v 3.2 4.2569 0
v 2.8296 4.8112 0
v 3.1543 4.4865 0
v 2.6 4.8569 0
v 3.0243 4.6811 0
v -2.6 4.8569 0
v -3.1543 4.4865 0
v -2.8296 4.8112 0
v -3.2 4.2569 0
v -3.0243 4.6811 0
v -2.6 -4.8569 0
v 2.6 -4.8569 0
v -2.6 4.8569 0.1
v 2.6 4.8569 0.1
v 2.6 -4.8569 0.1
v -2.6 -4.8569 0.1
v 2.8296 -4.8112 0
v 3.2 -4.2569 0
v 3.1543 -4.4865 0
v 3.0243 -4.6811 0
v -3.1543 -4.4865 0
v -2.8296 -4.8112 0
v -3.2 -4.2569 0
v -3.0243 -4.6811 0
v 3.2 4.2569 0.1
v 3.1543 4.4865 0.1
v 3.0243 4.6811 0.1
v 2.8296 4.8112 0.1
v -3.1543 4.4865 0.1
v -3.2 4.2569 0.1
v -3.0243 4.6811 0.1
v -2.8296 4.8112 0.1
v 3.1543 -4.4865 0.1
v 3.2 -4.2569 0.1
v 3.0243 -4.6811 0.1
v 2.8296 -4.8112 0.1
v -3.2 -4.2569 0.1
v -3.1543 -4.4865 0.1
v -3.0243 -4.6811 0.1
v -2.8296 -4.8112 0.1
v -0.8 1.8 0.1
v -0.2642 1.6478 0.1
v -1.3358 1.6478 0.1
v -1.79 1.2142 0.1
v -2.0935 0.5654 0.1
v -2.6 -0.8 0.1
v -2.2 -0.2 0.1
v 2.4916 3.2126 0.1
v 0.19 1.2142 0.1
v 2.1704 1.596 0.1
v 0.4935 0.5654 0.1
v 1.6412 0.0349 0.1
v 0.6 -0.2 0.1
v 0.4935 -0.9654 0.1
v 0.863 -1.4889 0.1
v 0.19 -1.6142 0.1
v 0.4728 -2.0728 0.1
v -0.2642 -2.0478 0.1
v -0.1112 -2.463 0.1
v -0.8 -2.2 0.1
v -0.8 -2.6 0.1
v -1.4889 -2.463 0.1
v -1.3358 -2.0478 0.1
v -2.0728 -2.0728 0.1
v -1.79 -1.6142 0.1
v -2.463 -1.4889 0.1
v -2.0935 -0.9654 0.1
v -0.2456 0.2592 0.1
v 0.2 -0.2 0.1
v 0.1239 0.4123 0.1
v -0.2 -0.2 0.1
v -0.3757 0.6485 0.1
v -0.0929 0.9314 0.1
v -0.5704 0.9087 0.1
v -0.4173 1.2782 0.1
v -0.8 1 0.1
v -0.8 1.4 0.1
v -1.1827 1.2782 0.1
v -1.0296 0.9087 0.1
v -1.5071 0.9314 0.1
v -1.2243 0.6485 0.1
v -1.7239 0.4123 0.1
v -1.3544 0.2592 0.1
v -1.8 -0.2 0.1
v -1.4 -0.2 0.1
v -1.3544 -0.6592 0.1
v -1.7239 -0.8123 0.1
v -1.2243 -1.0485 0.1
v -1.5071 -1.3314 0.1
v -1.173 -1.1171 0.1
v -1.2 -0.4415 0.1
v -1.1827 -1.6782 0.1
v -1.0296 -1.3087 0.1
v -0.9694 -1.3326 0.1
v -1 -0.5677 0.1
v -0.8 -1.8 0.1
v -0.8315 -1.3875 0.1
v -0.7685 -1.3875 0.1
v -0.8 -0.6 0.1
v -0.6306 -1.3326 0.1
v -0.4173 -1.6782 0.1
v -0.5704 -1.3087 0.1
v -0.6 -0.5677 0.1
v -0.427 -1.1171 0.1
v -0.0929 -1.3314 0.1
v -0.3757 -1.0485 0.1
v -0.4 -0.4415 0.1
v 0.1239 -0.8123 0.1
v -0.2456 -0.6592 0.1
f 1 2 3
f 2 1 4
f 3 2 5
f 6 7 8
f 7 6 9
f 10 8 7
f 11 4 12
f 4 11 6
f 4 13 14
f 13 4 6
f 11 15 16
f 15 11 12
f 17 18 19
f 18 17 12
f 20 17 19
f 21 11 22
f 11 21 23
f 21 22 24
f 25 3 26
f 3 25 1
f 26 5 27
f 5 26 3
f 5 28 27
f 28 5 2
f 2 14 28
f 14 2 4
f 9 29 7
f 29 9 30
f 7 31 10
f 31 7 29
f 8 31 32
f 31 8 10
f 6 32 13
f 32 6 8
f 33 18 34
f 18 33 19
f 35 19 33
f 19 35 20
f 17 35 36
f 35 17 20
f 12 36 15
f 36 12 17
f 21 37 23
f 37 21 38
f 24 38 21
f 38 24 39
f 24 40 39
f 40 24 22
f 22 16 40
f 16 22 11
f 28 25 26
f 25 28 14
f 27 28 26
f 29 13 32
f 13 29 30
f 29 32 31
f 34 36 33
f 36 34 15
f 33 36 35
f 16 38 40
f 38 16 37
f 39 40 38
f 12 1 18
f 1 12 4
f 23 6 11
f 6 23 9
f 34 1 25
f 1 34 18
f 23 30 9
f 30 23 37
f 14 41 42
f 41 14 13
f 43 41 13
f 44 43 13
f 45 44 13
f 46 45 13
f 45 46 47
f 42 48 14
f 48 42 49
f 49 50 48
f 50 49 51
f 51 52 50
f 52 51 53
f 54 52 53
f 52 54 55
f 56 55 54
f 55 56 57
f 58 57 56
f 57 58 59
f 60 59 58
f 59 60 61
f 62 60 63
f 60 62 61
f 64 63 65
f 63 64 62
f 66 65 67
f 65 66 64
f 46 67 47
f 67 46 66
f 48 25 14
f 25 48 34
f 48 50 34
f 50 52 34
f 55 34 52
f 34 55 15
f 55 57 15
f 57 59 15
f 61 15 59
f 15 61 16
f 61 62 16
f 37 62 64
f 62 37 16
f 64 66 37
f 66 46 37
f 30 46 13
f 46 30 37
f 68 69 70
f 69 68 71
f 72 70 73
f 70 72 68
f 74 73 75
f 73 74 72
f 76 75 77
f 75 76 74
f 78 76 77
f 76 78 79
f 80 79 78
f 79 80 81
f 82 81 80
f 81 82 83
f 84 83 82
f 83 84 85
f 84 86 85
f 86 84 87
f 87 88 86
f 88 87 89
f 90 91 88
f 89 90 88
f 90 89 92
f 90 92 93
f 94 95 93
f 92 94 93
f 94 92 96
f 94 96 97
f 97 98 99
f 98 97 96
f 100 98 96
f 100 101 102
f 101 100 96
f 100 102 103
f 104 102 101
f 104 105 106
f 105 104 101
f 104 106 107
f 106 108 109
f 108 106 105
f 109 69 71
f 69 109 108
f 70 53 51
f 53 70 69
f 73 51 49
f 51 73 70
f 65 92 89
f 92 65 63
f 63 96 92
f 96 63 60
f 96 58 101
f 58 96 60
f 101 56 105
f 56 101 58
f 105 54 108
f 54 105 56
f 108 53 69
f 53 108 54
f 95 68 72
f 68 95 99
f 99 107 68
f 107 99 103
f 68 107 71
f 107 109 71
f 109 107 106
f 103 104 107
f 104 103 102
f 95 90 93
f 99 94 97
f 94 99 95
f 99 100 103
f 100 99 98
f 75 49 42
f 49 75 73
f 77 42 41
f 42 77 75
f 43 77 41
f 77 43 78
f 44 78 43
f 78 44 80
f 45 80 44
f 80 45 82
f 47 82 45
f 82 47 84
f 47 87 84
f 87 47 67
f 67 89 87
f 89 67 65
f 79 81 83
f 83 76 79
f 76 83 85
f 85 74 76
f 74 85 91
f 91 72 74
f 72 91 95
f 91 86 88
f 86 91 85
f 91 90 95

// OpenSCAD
// file: ../p/box3u12.scad
use <../lib.scad>
function ldraw_lib__box3u12() = [
// 0 Box with 3 Parallel Faces without Any Edges
// 0 Name: box3u12.dat
// 0 Author: J.C. Tchang [tchang]
// 0 !LDRAW_ORG Primitive UPDATE 2014-02
// 0 !LICENSE Licensed under CC BY 4.0 : see CAreadme.txt
// 
// 0 BFC CERTIFY CCW
  [0,"BFC","CERTIFY"],
  [0,"BFC","CCW"],
// 
// 0 !HISTORY 2014-12-23 [PTadmin] Official Update 2014-02
// 
// 
// 4 16 -1 1 1 1 1 1 1 1 -1 -1 1 -1
  [4,16,-1,1,1,1,1,1,1,1,-1,-1,1,-1],
// 4 16 -1 1 1 -1 0 1 1 0 1 1 1 1
  [4,16,-1,1,1,-1,0,1,1,0,1,1,1,1],
// 4 16 1 1 -1 1 0 -1 -1 0 -1 -1 1 -1
  [4,16,1,1,-1,1,0,-1,-1,0,-1,-1,1,-1],
];
module ldraw_lib__box3u12(step=0, col=false, unit=2/5, alt=false, line=0.2, solid=!$preview)
    makepoly(ldraw_lib__box3u12(), step=step, col=col, unit=unit, alt=alt, line=line, solid=solid);
ldraw_lib__box3u12(line=0.2);
// file: ../p/1-4cyli.scad
use <../lib.scad>
function ldraw_lib__1_4cyli() = [
// 0 Cylinder 0.25
// 0 Name: 1-4cyli.dat
// 0 Author: James Jessiman
// 0 !LDRAW_ORG Primitive UPDATE 2012-01
// 0 !LICENSE Licensed under CC BY 4.0 : see CAreadme.txt
// 
// 0 BFC CERTIFY CCW
  [0,"BFC","CERTIFY"],
  [0,"BFC","CCW"],
// 
// 0 !HISTORY 2002-03-23 [sbliss] Added BFC statement.
// 0 !HISTORY 2002-04-25 [PTadmin] Official Update 2002-02
// 0 !HISTORY 2007-06-22 [PTadmin] Header formatted for Contributor Agreement
// 0 !HISTORY 2008-07-01 [PTadmin] Official Update 2008-01
// 0 !HISTORY 2012-02-16 [Philo] Changed to CCW
// 0 !HISTORY 2012-03-30 [PTadmin] Official Update 2012-01
// 
// 
// 4 16 1 1 0 0.9239 1 0.3827 0.9239 0 0.3827 1 0 0
  [4,16,1,1,0,0.9239,1,0.3827,0.9239,0,0.3827,1,0,0],
// 5 24 1 0 0 1 1 0 0.9239 0 0.3827 1 0 -1
  [5,24,1,0,0,1,1,0,0.9239,0,0.3827,1,0,-1],
// 4 16 0.9239 1 0.3827 0.7071 1 0.7071 0.7071 0 0.7071 0.9239 0 0.3827
  [4,16,0.9239,1,0.3827,0.7071,1,0.7071,0.7071,0,0.7071,0.9239,0,0.3827],
// 5 24 0.9239 0 0.3827 0.9239 1 0.3827 0.7071 0 0.7071 1 0 0
  [5,24,0.9239,0,0.3827,0.9239,1,0.3827,0.7071,0,0.7071,1,0,0],
// 4 16 0.7071 1 0.7071 0.3827 1 0.9239 0.3827 0 0.9239 0.7071 0 0.7071
  [4,16,0.7071,1,0.7071,0.3827,1,0.9239,0.3827,0,0.9239,0.7071,0,0.7071],
// 5 24 0.7071 0 0.7071 0.7071 1 0.7071 0.3827 0 0.9239 0.9239 0 0.3827
  [5,24,0.7071,0,0.7071,0.7071,1,0.7071,0.3827,0,0.9239,0.9239,0,0.3827],
// 4 16 0.3827 1 0.9239 0 1 1 0 0 1 0.3827 0 0.9239
  [4,16,0.3827,1,0.9239,0,1,1,0,0,1,0.3827,0,0.9239],
// 5 24 0.3827 0 0.9239 0.3827 1 0.9239 0 0 1 0.7071 0 0.7071
  [5,24,0.3827,0,0.9239,0.3827,1,0.9239,0,0,1,0.7071,0,0.7071],
// 5 24 0 0 1 0 1 1 0.3827 0 0.9239 -1 0 1
  [5,24,0,0,1,0,1,1,0.3827,0,0.9239,-1,0,1],
];
module ldraw_lib__1_4cyli(step=0, col=false, unit=2/5, alt=false, line=0.2, solid=!$preview)
    makepoly(ldraw_lib__1_4cyli(), step=step, col=col, unit=unit, alt=alt, line=line, solid=solid);
ldraw_lib__1_4cyli(line=0.2);
// file: ../p/1-4chrd.scad
use <../lib.scad>
function ldraw_lib__1_4chrd() = [
// 0 Chord 0.25
// 0 Name: 1-4chrd.dat
// 0 Author: Max Martin Richter [MMR1988]
// 0 !LDRAW_ORG Primitive UPDATE 2023-05
// 0 !LICENSE Licensed under CC BY 4.0 : see CAreadme.txt
// 
// 0 BFC CERTIFY CCW
  [0,"BFC","CERTIFY"],
  [0,"BFC","CCW"],
// 
// 0 !HISTORY 2004-04-22 [PTadmin] Official Update 2004-02
// 0 !HISTORY 2007-10-09 [PTadmin] Header formatted for Contributor Agreement
// 0 !HISTORY 2008-07-01 [PTadmin] Official Update 2008-01
// 0 !HISTORY 2012-08-02 [MMR1988] Re-creation with PrimGen2 and Rectifier
// 0 !HISTORY 2012-08-09 [PTadmin] Official Update 2012-02
// 0 !HISTORY 2023-10-27 [OrionP] Change author to MMR1988 from hafhead
// 0 !HISTORY 2023-10-31 [OrionP] Official Update 2023-05
// 
// 4 16 0.9239 0 0.3827 0.3827 0 0.9239 0 0 1 1 0 0
  [4,16,0.9239,0,0.3827,0.3827,0,0.9239,0,0,1,1,0,0],
// 3 16 0.7071 0 0.7071 0.3827 0 0.9239 0.9239 0 0.3827
  [3,16,0.7071,0,0.7071,0.3827,0,0.9239,0.9239,0,0.3827],
];
module ldraw_lib__1_4chrd(step=0, col=false, unit=2/5, alt=false, line=0.2, solid=!$preview)
    makepoly(ldraw_lib__1_4chrd(), step=step, col=col, unit=unit, alt=alt, line=line, solid=solid);
ldraw_lib__1_4chrd(line=0.2);
// file: s/6148328ags02.scad
use <../../lib.scad>
function ldraw_lib__s__6148328ags02() = [
// 0 ~Sticker  1.8 x  0.8 with Black Headlamp on White Background Right - Headlamp
// 0 Name: s\6148328ags02.dat
// 0 Author: Massimo Maso [Sirio]
// 0 !LDRAW_ORG Subpart UPDATE 2024-01
// 0 !LICENSE Licensed under CC BY 4.0 : see CAreadme.txt
// 
// 0 BFC CERTIFY CCW
  [0,"BFC","CERTIFY"],
  [0,"BFC","CCW"],
// 
// 0 !HISTORY 2024-01-29 [OrionP] Official Update 2024-01
// 
// 
// 0 // Faces
// 0 // Black faces
// 
// 4 0 2.3098 0 1.5308 1.3859 0 1.1481 1.5 0 0 2.5 0 0
  [4,0,2.3098,0,1.5308,1.3859,0,1.1481,1.5,0,0,2.5,0,0],
// 4 0 2.3098 0 1.5308 1.7678 0 2.8284 1.0607 0 2.1213 1.3859 0 1.1481
  [4,0,2.3098,0,1.5308,1.7678,0,2.8284,1.0607,0,2.1213,1.3859,0,1.1481],
// 4 0 .9568 0 3.6956 .5741 0 2.7717 1.0607 0 2.1213 1.7678 0 2.8284
  [4,0,.9568,0,3.6956,.5741,0,2.7717,1.0607,0,2.1213,1.7678,0,2.8284],
// 4 0 .9568 0 3.6956 0 0 4 0 0 3 .5741 0 2.7717
  [4,0,.9568,0,3.6956,0,0,4,0,0,3,.5741,0,2.7717],
// 4 0 -.9568 0 3.6956 -.5741 0 2.7717 0 0 3 0 0 4
  [4,0,-.9568,0,3.6956,-.5741,0,2.7717,0,0,3,0,0,4],
// 4 0 -.9568 0 3.6956 -1.7678 0 2.8284 -1.0607 0 2.1213 -.5741 0 2.7717
  [4,0,-.9568,0,3.6956,-1.7678,0,2.8284,-1.0607,0,2.1213,-.5741,0,2.7717],
// 4 0 -2.3098 0 1.5308 -1.3859 0 1.1481 -1.0607 0 2.1213 -1.7678 0 2.8284
  [4,0,-2.3098,0,1.5308,-1.3859,0,1.1481,-1.0607,0,2.1213,-1.7678,0,2.8284],
// 4 0 -2.3098 0 1.5308 -2.5 0 0 -1.5 0 0 -1.3859 0 1.1481
  [4,0,-2.3098,0,1.5308,-2.5,0,0,-1.5,0,0,-1.3859,0,1.1481],
// 4 0 -2.3098 0 -1.5308 -1.3859 0 -1.1481 -1.5 0 0 -2.5 0 0
  [4,0,-2.3098,0,-1.5308,-1.3859,0,-1.1481,-1.5,0,0,-2.5,0,0],
// 4 0 -2.3098 0 -1.5308 -1.7678 0 -2.8284 -1.0607 0 -2.1213 -1.3859 0 -1.1481
  [4,0,-2.3098,0,-1.5308,-1.7678,0,-2.8284,-1.0607,0,-2.1213,-1.3859,0,-1.1481],
// 3 0 -.9324 0 -2.2927 -1 0 -.6038 -1.0607 0 -2.1213
  [3,0,-.9324,0,-2.2927,-1,0,-.6038,-1.0607,0,-2.1213],
// 4 0 -.9324 0 -2.2927 -1.0607 0 -2.1213 -1.7678 0 -2.8284 -.9568 0 -3.6956
  [4,0,-.9324,0,-2.2927,-1.0607,0,-2.1213,-1.7678,0,-2.8284,-.9568,0,-3.6956],
// 3 0 -.9324 0 -2.2927 -.9568 0 -3.6956 -.5741 0 -2.7717
  [3,0,-.9324,0,-2.2927,-.9568,0,-3.6956,-.5741,0,-2.7717],
// 3 0 -.4235 0 -2.8316 -.5 0 -.9192 -.5741 0 -2.7717
  [3,0,-.4235,0,-2.8316,-.5,0,-.9192,-.5741,0,-2.7717],
// 4 0 -.4235 0 -2.8316 -.5741 0 -2.7717 -.9568 0 -3.6956 0 0 -4
  [4,0,-.4235,0,-2.8316,-.5741,0,-2.7717,-.9568,0,-3.6956,0,0,-4],
// 3 0 -.4235 0 -2.8316 0 0 -4 -.0787 0 -2.9687
  [3,0,-.4235,0,-2.8316,0,0,-4,-.0787,0,-2.9687],
// 4 0 0 0 -4 .0787 0 -2.9687 0 0 -1 -.0787 0 -2.9687
  [4,0,0,0,-4,.0787,0,-2.9687,0,0,-1,-.0787,0,-2.9687],
// 3 0 .4235 0 -2.8316 .0787 0 -2.9687 0 0 -4
  [3,0,.4235,0,-2.8316,.0787,0,-2.9687,0,0,-4],
// 4 0 .4235 0 -2.8316 0 0 -4 .9568 0 -3.6956 .5741 0 -2.7717
  [4,0,.4235,0,-2.8316,0,0,-4,.9568,0,-3.6956,.5741,0,-2.7717],
// 3 0 .4235 0 -2.8316 .5741 0 -2.7717 .5 0 -.9192
  [3,0,.4235,0,-2.8316,.5741,0,-2.7717,.5,0,-.9192],
// 3 0 .9324 0 -2.2927 .5741 0 -2.7717 .9568 0 -3.6956
  [3,0,.9324,0,-2.2927,.5741,0,-2.7717,.9568,0,-3.6956],
// 4 0 .9324 0 -2.2927 .9568 0 -3.6956 1.7678 0 -2.8284 1.0607 0 -2.1213
  [4,0,.9324,0,-2.2927,.9568,0,-3.6956,1.7678,0,-2.8284,1.0607,0,-2.1213],
// 3 0 .9324 0 -2.2927 1.0607 0 -2.1213 1 0 -.6038
  [3,0,.9324,0,-2.2927,1.0607,0,-2.1213,1,0,-.6038],
// 4 0 2.3098 0 -1.5308 1.3859 0 -1.1481 1.0607 0 -2.1213 1.7678 0 -2.8284
  [4,0,2.3098,0,-1.5308,1.3859,0,-1.1481,1.0607,0,-2.1213,1.7678,0,-2.8284],
// 4 0 2.3098 0 -1.5308 2.5 0 0 1.5 0 0 1.3859 0 -1.1481
  [4,0,2.3098,0,-1.5308,2.5,0,0,1.5,0,0,1.3859,0,-1.1481],
// 0 // Dark grey faces - actually halftone of white ndis and black disc
// 4 72 2.3098 0 1.5308 2.5 0 0 3.5 0 0 3.2337 0 1.9135
  [4,72,2.3098,0,1.5308,2.5,0,0,3.5,0,0,3.2337,0,1.9135],
// 4 72 2.3098 0 1.5308 3.2337 0 1.9135 2.4749 0 3.5355 1.7678 0 2.8284
  [4,72,2.3098,0,1.5308,3.2337,0,1.9135,2.4749,0,3.5355,1.7678,0,2.8284],
// 4 72 -.9568 0 -3.6956 -1.7678 0 -2.8284 -2.4749 0 -3.5355 -1.3395 0 -4.6195
  [4,72,-.9568,0,-3.6956,-1.7678,0,-2.8284,-2.4749,0,-3.5355,-1.3395,0,-4.6195],
// 4 72 -.9568 0 -3.6956 -1.3395 0 -4.6195 0 0 -5 0 0 -4
  [4,72,-.9568,0,-3.6956,-1.3395,0,-4.6195,0,0,-5,0,0,-4],
// 4 72 .9568 0 -3.6956 0 0 -4 0 0 -5 1.3395 0 -4.6195
  [4,72,.9568,0,-3.6956,0,0,-4,0,0,-5,1.3395,0,-4.6195],
// 4 72 .9568 0 -3.6956 1.3395 0 -4.6195 2.4749 0 -3.5355 1.7678 0 -2.8284
  [4,72,.9568,0,-3.6956,1.3395,0,-4.6195,2.4749,0,-3.5355,1.7678,0,-2.8284],
// 4 72 2.3098 0 -1.5308 1.7678 0 -2.8284 2.4749 0 -3.5355 3.2337 0 -1.9135
  [4,72,2.3098,0,-1.5308,1.7678,0,-2.8284,2.4749,0,-3.5355,3.2337,0,-1.9135],
// 4 72 2.3098 0 -1.5308 3.2337 0 -1.9135 3.5 0 0 2.5 0 0
  [4,72,2.3098,0,-1.5308,3.2337,0,-1.9135,3.5,0,0,2.5,0,0],
// 4 72 1.3859 0 1.1481 1.0607 0 2.1213 -.5 0 -.9192 0 0 -1
  [4,72,1.3859,0,1.1481,1.0607,0,2.1213,-.5,0,-.9192,0,0,-1],
// 4 72 1.3859 0 1.1481 0 0 -1 .5 0 -.9192 1 0 -.6038
  [4,72,1.3859,0,1.1481,0,0,-1,.5,0,-.9192,1,0,-.6038],
// 3 72 1.3859 0 1.1481 1 0 -.6038 1.5 0 0
  [3,72,1.3859,0,1.1481,1,0,-.6038,1.5,0,0],
// 4 72 1 0 -.6038 1.0607 0 -2.1213 1.3859 0 -1.1481 1.5 0 0
  [4,72,1,0,-.6038,1.0607,0,-2.1213,1.3859,0,-1.1481,1.5,0,0],
// 4 72 1 0 -.6038 .5 0 -.9192 .5741 0 -2.7717 .9324 0 -2.2927
  [4,72,1,0,-.6038,.5,0,-.9192,.5741,0,-2.7717,.9324,0,-2.2927],
// 3 72 -.5 0 -.9192 -.9324 0 -2.2927 -.5741 0 -2.7717
  [3,72,-.5,0,-.9192,-.9324,0,-2.2927,-.5741,0,-2.7717],
// 4 72 -.5 0 -.9192 -.4235 0 -2.8316 -.0787 0 -2.9687 0 0 -1
  [4,72,-.5,0,-.9192,-.4235,0,-2.8316,-.0787,0,-2.9687,0,0,-1],
// 4 72 0 0 -1 .0787 0 -2.9687 .4235 0 -2.8316 .5 0 -.9192
  [4,72,0,0,-1,.0787,0,-2.9687,.4235,0,-2.8316,.5,0,-.9192],
// 0 // White faces
// 4 15 .9568 0 3.6956 1.7678 0 2.8284 2.4749 0 3.5355 1.3395 0 4.6195
  [4,15,.9568,0,3.6956,1.7678,0,2.8284,2.4749,0,3.5355,1.3395,0,4.6195],
// 4 15 .9568 0 3.6956 1.3395 0 4.6195 0 0 5 0 0 4
  [4,15,.9568,0,3.6956,1.3395,0,4.6195,0,0,5,0,0,4],
// 4 15 -.9568 0 3.6956 0 0 4 0 0 5 -1.3395 0 4.6195
  [4,15,-.9568,0,3.6956,0,0,4,0,0,5,-1.3395,0,4.6195],
// 4 15 -.9568 0 3.6956 -1.3395 0 4.6195 -2.4749 0 3.5355 -1.7678 0 2.8284
  [4,15,-.9568,0,3.6956,-1.3395,0,4.6195,-2.4749,0,3.5355,-1.7678,0,2.8284],
// 4 15 -2.3098 0 1.5308 -1.7678 0 2.8284 -2.4749 0 3.5355 -3.2337 0 1.9135
  [4,15,-2.3098,0,1.5308,-1.7678,0,2.8284,-2.4749,0,3.5355,-3.2337,0,1.9135],
// 4 15 -2.3098 0 1.5308 -3.2337 0 1.9135 -3.5 0 0 -2.5 0 0
  [4,15,-2.3098,0,1.5308,-3.2337,0,1.9135,-3.5,0,0,-2.5,0,0],
// 4 15 -2.3098 0 -1.5308 -2.5 0 0 -3.5 0 0 -3.2337 0 -1.9135
  [4,15,-2.3098,0,-1.5308,-2.5,0,0,-3.5,0,0,-3.2337,0,-1.9135],
// 4 15 -2.3098 0 -1.5308 -3.2337 0 -1.9135 -2.4749 0 -3.5355 -1.7678 0 -2.8284
  [4,15,-2.3098,0,-1.5308,-3.2337,0,-1.9135,-2.4749,0,-3.5355,-1.7678,0,-2.8284],
// 3 15 -.5741 0 2.7717 -1.0607 0 2.1213 -1.3859 0 1.1481
  [3,15,-.5741,0,2.7717,-1.0607,0,2.1213,-1.3859,0,1.1481],
// 4 15 -.5741 0 2.7717 -1.3859 0 1.1481 -1.5 0 0 0 0 3
  [4,15,-.5741,0,2.7717,-1.3859,0,1.1481,-1.5,0,0,0,0,3],
// 4 15 -1 0 -.6038 .5741 0 2.7717 0 0 3 -1.5 0 0
  [4,15,-1,0,-.6038,.5741,0,2.7717,0,0,3,-1.5,0,0],
// 4 15 -1 0 -.6038 -.5 0 -.9192 1.0607 0 2.1213 .5741 0 2.7717
  [4,15,-1,0,-.6038,-.5,0,-.9192,1.0607,0,2.1213,.5741,0,2.7717],
// 4 15 -1 0 -.6038 -1.5 0 0 -1.3859 0 -1.1481 -1.0607 0 -2.1213
  [4,15,-1,0,-.6038,-1.5,0,0,-1.3859,0,-1.1481,-1.0607,0,-2.1213],
// 3 15 -1 0 -.6038 -.9324 0 -2.2927 -.5 0 -.9192
  [3,15,-1,0,-.6038,-.9324,0,-2.2927,-.5,0,-.9192],
];
module ldraw_lib__s__6148328ags02(step=0, col=false, unit=2/5, alt=false, line=0.2, solid=!$preview)
    makepoly(ldraw_lib__s__6148328ags02(), step=step, col=col, unit=unit, alt=alt, line=line, solid=solid);
ldraw_lib__s__6148328ags02(line=0.2);
// file: s/6148328ags01.scad
use <../../lib.scad>
use <../../p/1-4chrd.scad>
use <../../p/1-4cyli.scad>
use <../../p/box3u12.scad>
function ldraw_lib__s__6148328ags01() = [
// 0 ~Sticker  1.8 x  0.8 with Black Headlamp on White Background Right - Common Part
// 0 Name: s\6148328ags01.dat
// 0 Author: Massimo Maso [Sirio]
// 0 !LDRAW_ORG Subpart UPDATE 2024-01
// 0 !LICENSE Licensed under CC BY 4.0 : see CAreadme.txt
// 
// 0 BFC CERTIFY CCW
  [0,"BFC","CERTIFY"],
  [0,"BFC","CCW"],
// 
// 0 !HISTORY 2024-01-29 [OrionP] Official Update 2024-01
// 
// 
// 0 // Primitives
// 
// 1 16 -6.5 0 10.6422 -1.5 0 0 0 -1 0 0 0 1.5 1-4chrd.dat
  [1,16,-6.5,0,10.6422,-1.5,0,0,0,-1,0,0,0,1.5, ldraw_lib__1_4chrd()],
// 1 16 6.5 0 10.6422 1.5 0 0 0 -1 0 0 0 1.5 1-4chrd.dat
  [1,16,6.5,0,10.6422,1.5,0,0,0,-1,0,0,0,1.5, ldraw_lib__1_4chrd()],
// 1 16 0 -.25 0 6.5 0 0 0 .25 0 0 0 12.1422 box3u12.dat
  [1,16,0,-.25,0,6.5,0,0,0,.25,0,0,0,12.1422, ldraw_lib__box3u12()],
// 1 16 -6.5 0 -10.6422 -1.5 0 0 0 -1 0 0 0 -1.5 1-4chrd.dat
  [1,16,-6.5,0,-10.6422,-1.5,0,0,0,-1,0,0,0,-1.5, ldraw_lib__1_4chrd()],
// 1 16 6.5 0 -10.6422 1.5 0 0 0 -1 0 0 0 -1.5 1-4chrd.dat
  [1,16,6.5,0,-10.6422,1.5,0,0,0,-1,0,0,0,-1.5, ldraw_lib__1_4chrd()],
// 1 16 -6.5 0 10.6422 -1.5 0 0 0 -.25 0 0 0 1.5 1-4cyli.dat
  [1,16,-6.5,0,10.6422,-1.5,0,0,0,-.25,0,0,0,1.5, ldraw_lib__1_4cyli()],
// 1 16 6.5 0 10.6422 1.5 0 0 0 -.25 0 0 0 1.5 1-4cyli.dat
  [1,16,6.5,0,10.6422,1.5,0,0,0,-.25,0,0,0,1.5, ldraw_lib__1_4cyli()],
// 1 16 -6.5 0 -10.6422 -1.5 0 0 0 -.25 0 0 0 -1.5 1-4cyli.dat
  [1,16,-6.5,0,-10.6422,-1.5,0,0,0,-.25,0,0,0,-1.5, ldraw_lib__1_4cyli()],
// 1 16 6.5 0 -10.6422 1.5 0 0 0 -.25 0 0 0 -1.5 1-4cyli.dat
  [1,16,6.5,0,-10.6422,1.5,0,0,0,-.25,0,0,0,-1.5, ldraw_lib__1_4cyli()],
// 1 15 -6.5 -.25 10.6422 -1.5 0 0 0 1 0 0 0 1.5 1-4chrd.dat
  [1,15,-6.5,-.25,10.6422,-1.5,0,0,0,1,0,0,0,1.5, ldraw_lib__1_4chrd()],
// 1 15 6.5 -.25 10.6422 1.5 0 0 0 1 0 0 0 1.5 1-4chrd.dat
  [1,15,6.5,-.25,10.6422,1.5,0,0,0,1,0,0,0,1.5, ldraw_lib__1_4chrd()],
// 1 15 -6.5 -.25 -10.6422 -1.5 0 0 0 1 0 0 0 -1.5 1-4chrd.dat
  [1,15,-6.5,-.25,-10.6422,-1.5,0,0,0,1,0,0,0,-1.5, ldraw_lib__1_4chrd()],
// 1 15 6.5 -.25 -10.6422 1.5 0 0 0 1 0 0 0 -1.5 1-4chrd.dat
  [1,15,6.5,-.25,-10.6422,1.5,0,0,0,1,0,0,0,-1.5, ldraw_lib__1_4chrd()],
// 0 // Bottom faces
// 4 16 -6.5 0 12.1422 -6.5 0 -12.1422 -8 0 -10.6422 -8 0 10.6422
  [4,16,-6.5,0,12.1422,-6.5,0,-12.1422,-8,0,-10.6422,-8,0,10.6422],
// 4 16 6.5 0 12.1422 8 0 10.6422 8 0 -10.6422 6.5 0 -12.1422
  [4,16,6.5,0,12.1422,8,0,10.6422,8,0,-10.6422,6.5,0,-12.1422],
// 0 // Lateral faces
// 4 16 -8 0 10.6422 -8 0 -10.6422 -8 -.25 -10.6422 -8 -.25 10.6422
  [4,16,-8,0,10.6422,-8,0,-10.6422,-8,-.25,-10.6422,-8,-.25,10.6422],
// 4 16 8 0 10.6422 8 -.25 10.6422 8 -.25 -10.6422 8 0 -10.6422
  [4,16,8,0,10.6422,8,-.25,10.6422,8,-.25,-10.6422,8,0,-10.6422],
// 0 // Top faces
// 0 // Black faces
// 4 0 -6.5 -.25 12.1422 .6605 -.25 4.1195 2 -.25 4.5 6.5 -.25 12.1422
  [4,0,-6.5,-.25,12.1422,.6605,-.25,4.1195,2,-.25,4.5,6.5,-.25,12.1422],
// 3 0 6.5 -.25 12.1422 2 -.25 4.5 3.3395 -.25 4.1195
  [3,0,6.5,-.25,12.1422,2,-.25,4.5,3.3395,-.25,4.1195],
// 3 0 6.5 -.25 12.1422 3.3395 -.25 4.1195 4.4749 -.25 3.0355
  [3,0,6.5,-.25,12.1422,3.3395,-.25,4.1195,4.4749,-.25,3.0355],
// 3 0 6.5 -.25 12.1422 4.4749 -.25 3.0355 5.2337 -.25 1.4135
  [3,0,6.5,-.25,12.1422,4.4749,-.25,3.0355,5.2337,-.25,1.4135],
// 4 0 6.5 -.25 12.1422 5.2337 -.25 1.4135 5.5 -.25 -.5 6.5 -.25 -2
  [4,0,6.5,-.25,12.1422,5.2337,-.25,1.4135,5.5,-.25,-.5,6.5,-.25,-2],
// 4 0 -.4749 -.25 3.0355 .6605 -.25 4.1195 -6.5 -.25 12.1422 -6.2291 -.25 8.0315
  [4,0,-.4749,-.25,3.0355,.6605,-.25,4.1195,-6.5,-.25,12.1422,-6.2291,-.25,8.0315],
// 4 0 -.4749 -.25 3.0355 -6.2291 -.25 8.0315 -5.4259 -.25 3.99 -1.2337 -.25 1.4135
  [4,0,-.4749,-.25,3.0355,-6.2291,-.25,8.0315,-5.4259,-.25,3.99,-1.2337,-.25,1.4135],
// 4 0 -1.5 -.25 -.5 -1.2337 -.25 1.4135 -5.4259 -.25 3.99 -4.1029 -.25 .0872
  [4,0,-1.5,-.25,-.5,-1.2337,-.25,1.4135,-5.4259,-.25,3.99,-4.1029,-.25,.0872],
// 4 0 -1.5 -.25 -.5 -4.1029 -.25 .0872 -2.1576 -.25 -3.7222 -1.2337 -.25 -2.4135
  [4,0,-1.5,-.25,-.5,-4.1029,-.25,.0872,-2.1576,-.25,-3.7222,-1.2337,-.25,-2.4135],
// 4 0 -.4749 -.25 -4.0355 -1.2337 -.25 -2.4135 -2.1576 -.25 -3.7222 -1.182 -.25 -5.182
  [4,0,-.4749,-.25,-4.0355,-1.2337,-.25,-2.4135,-2.1576,-.25,-3.7222,-1.182,-.25,-5.182],
// 4 0 -.4749 -.25 -4.0355 -1.182 -.25 -5.182 .2779 -.25 -6.1576 .6605 -.25 -5.1195
  [4,0,-.4749,-.25,-4.0355,-1.182,-.25,-5.182,.2779,-.25,-6.1576,.6605,-.25,-5.1195],
// 4 0 2 -.25 -5.5 .6605 -.25 -5.1195 .2779 -.25 -6.1576 2 -.25 -6.5
  [4,0,2,-.25,-5.5,.6605,-.25,-5.1195,.2779,-.25,-6.1576,2,-.25,-6.5],
// 4 0 2 -.25 -5.5 2 -.25 -6.5 3.7222 -.25 -6.1576 3.3395 -.25 -5.1195
  [4,0,2,-.25,-5.5,2,-.25,-6.5,3.7222,-.25,-6.1576,3.3395,-.25,-5.1195],
// 4 0 4.4749 -.25 -4.0355 3.3395 -.25 -5.1195 3.7222 -.25 -6.1576 5.182 -.25 -5.182
  [4,0,4.4749,-.25,-4.0355,3.3395,-.25,-5.1195,3.7222,-.25,-6.1576,5.182,-.25,-5.182],
// 4 0 4.4749 -.25 -4.0355 5.182 -.25 -5.182 6.1576 -.25 -3.7222 5.2337 -.25 -2.4135
  [4,0,4.4749,-.25,-4.0355,5.182,-.25,-5.182,6.1576,-.25,-3.7222,5.2337,-.25,-2.4135],
// 4 0 5.5 -.25 -.5 5.2337 -.25 -2.4135 6.1576 -.25 -3.7222 6.5 -.25 -2
  [4,0,5.5,-.25,-.5,5.2337,-.25,-2.4135,6.1576,-.25,-3.7222,6.5,-.25,-2],
// 0 // White faces
// 4 15 -8 -.25 -10.6422 -6.2291 -.25 8.0315 -6.5 -.25 12.1422 -8 -.25 10.6422
  [4,15,-8,-.25,-10.6422,-6.2291,-.25,8.0315,-6.5,-.25,12.1422,-8,-.25,10.6422],
// 3 15 -8 -.25 -10.6422 -5.4259 -.25 3.99 -6.2291 -.25 8.0315
  [3,15,-8,-.25,-10.6422,-5.4259,-.25,3.99,-6.2291,-.25,8.0315],
// 3 15 -8 -.25 -10.6422 -4.1029 -.25 .0872 -5.4259 -.25 3.99
  [3,15,-8,-.25,-10.6422,-4.1029,-.25,.0872,-5.4259,-.25,3.99],
// 4 15 -8 -.25 -10.6422 -6.5 -.25 -12.1422 -2.1576 -.25 -3.7222 -4.1029 -.25 .0872
  [4,15,-8,-.25,-10.6422,-6.5,-.25,-12.1422,-2.1576,-.25,-3.7222,-4.1029,-.25,.0872],
// 3 15 -6.5 -.25 -12.1422 -1.182 -.25 -5.182 -2.1576 -.25 -3.7222
  [3,15,-6.5,-.25,-12.1422,-1.182,-.25,-5.182,-2.1576,-.25,-3.7222],
// 3 15 -6.5 -.25 -12.1422 .2779 -.25 -6.1576 -1.182 -.25 -5.182
  [3,15,-6.5,-.25,-12.1422,.2779,-.25,-6.1576,-1.182,-.25,-5.182],
// 4 15 -6.5 -.25 -12.1422 6.5 -.25 -12.1422 2 -.25 -6.5 .2779 -.25 -6.1576
  [4,15,-6.5,-.25,-12.1422,6.5,-.25,-12.1422,2,-.25,-6.5,.2779,-.25,-6.1576],
// 3 15 6.5 -.25 -12.1422 3.7222 -.25 -6.1576 2 -.25 -6.5
  [3,15,6.5,-.25,-12.1422,3.7222,-.25,-6.1576,2,-.25,-6.5],
// 4 15 6.5 -.25 -12.1422 8 -.25 -10.6422 5.182 -.25 -5.182 3.7222 -.25 -6.1576
  [4,15,6.5,-.25,-12.1422,8,-.25,-10.6422,5.182,-.25,-5.182,3.7222,-.25,-6.1576],
// 3 15 8 -.25 -10.6422 6.1576 -.25 -3.7222 5.182 -.25 -5.182
  [3,15,8,-.25,-10.6422,6.1576,-.25,-3.7222,5.182,-.25,-5.182],
// 3 15 8 -.25 -10.6422 6.5 -.25 -2 6.1576 -.25 -3.7222
  [3,15,8,-.25,-10.6422,6.5,-.25,-2,6.1576,-.25,-3.7222],
// 4 15 8 -.25 -10.6422 8 -.25 10.6422 6.5 -.25 12.1422 6.5 -.25 -2
  [4,15,8,-.25,-10.6422,8,-.25,10.6422,6.5,-.25,12.1422,6.5,-.25,-2],
];
module ldraw_lib__s__6148328ags01(step=0, col=false, unit=2/5, alt=false, line=0.2, solid=!$preview)
    makepoly(ldraw_lib__s__6148328ags01(), step=step, col=col, unit=unit, alt=alt, line=line, solid=solid);
ldraw_lib__s__6148328ags01(line=0.2);
// main file
use <../lib.scad>
use <s/6148328ags01.scad>
use <s/6148328ags02.scad>
function ldraw_lib__6148328ah() = [
// 0 Sticker  1.8 x  0.8 with Black Headlamp on White Background Left (Needs Work)
// 0 Name: 6148328ah.dat
// 0 Author: Massimo Maso [Sirio]
// 0 !LDRAW_ORG Part UPDATE 2024-01
// 0 !LICENSE Licensed under CC BY 4.0 : see CAreadme.txt
// 
// 0 !HELP Needs work: halftone areas in the headlamp are simplified with dark grey faces
// 
// 0 BFC CERTIFY CCW
  [0,"BFC","CERTIFY"],
  [0,"BFC","CCW"],
// 
// 0 !KEYWORDS 917K, Bricklink 75876stk01, Brickowl 852010, Pit Lane, Porsche
// 0 !KEYWORDS Rebrickable 26357, set 75876, Speed Champions
// 
// 0 !HISTORY 2024-01-29 [OrionP] Official Update 2024-01
// 
// 
// 1 16 0 0 0 -1 0 0 0 1 0 0 0 1 s\6148328ags01.dat
  [1,16,0,0,0,-1,0,0,0,1,0,0,0,1, ldraw_lib__s__6148328ags01()],
// 1 16 -2 -.25 -.5 1 0 0 0 1 0 0 0 1 s\6148328ags02.dat
  [1,16,-2,-.25,-.5,1,0,0,0,1,0,0,0,1, ldraw_lib__s__6148328ags02()],
];
module ldraw_lib__6148328ah(step=0, col=false, unit=2/5, alt=false, line=0.2, solid=!$preview)
    makepoly(ldraw_lib__6148328ah(), step=step, col=col, unit=unit, alt=alt, line=line, solid=solid);
ldraw_lib__6148328ah(line=0.2);
